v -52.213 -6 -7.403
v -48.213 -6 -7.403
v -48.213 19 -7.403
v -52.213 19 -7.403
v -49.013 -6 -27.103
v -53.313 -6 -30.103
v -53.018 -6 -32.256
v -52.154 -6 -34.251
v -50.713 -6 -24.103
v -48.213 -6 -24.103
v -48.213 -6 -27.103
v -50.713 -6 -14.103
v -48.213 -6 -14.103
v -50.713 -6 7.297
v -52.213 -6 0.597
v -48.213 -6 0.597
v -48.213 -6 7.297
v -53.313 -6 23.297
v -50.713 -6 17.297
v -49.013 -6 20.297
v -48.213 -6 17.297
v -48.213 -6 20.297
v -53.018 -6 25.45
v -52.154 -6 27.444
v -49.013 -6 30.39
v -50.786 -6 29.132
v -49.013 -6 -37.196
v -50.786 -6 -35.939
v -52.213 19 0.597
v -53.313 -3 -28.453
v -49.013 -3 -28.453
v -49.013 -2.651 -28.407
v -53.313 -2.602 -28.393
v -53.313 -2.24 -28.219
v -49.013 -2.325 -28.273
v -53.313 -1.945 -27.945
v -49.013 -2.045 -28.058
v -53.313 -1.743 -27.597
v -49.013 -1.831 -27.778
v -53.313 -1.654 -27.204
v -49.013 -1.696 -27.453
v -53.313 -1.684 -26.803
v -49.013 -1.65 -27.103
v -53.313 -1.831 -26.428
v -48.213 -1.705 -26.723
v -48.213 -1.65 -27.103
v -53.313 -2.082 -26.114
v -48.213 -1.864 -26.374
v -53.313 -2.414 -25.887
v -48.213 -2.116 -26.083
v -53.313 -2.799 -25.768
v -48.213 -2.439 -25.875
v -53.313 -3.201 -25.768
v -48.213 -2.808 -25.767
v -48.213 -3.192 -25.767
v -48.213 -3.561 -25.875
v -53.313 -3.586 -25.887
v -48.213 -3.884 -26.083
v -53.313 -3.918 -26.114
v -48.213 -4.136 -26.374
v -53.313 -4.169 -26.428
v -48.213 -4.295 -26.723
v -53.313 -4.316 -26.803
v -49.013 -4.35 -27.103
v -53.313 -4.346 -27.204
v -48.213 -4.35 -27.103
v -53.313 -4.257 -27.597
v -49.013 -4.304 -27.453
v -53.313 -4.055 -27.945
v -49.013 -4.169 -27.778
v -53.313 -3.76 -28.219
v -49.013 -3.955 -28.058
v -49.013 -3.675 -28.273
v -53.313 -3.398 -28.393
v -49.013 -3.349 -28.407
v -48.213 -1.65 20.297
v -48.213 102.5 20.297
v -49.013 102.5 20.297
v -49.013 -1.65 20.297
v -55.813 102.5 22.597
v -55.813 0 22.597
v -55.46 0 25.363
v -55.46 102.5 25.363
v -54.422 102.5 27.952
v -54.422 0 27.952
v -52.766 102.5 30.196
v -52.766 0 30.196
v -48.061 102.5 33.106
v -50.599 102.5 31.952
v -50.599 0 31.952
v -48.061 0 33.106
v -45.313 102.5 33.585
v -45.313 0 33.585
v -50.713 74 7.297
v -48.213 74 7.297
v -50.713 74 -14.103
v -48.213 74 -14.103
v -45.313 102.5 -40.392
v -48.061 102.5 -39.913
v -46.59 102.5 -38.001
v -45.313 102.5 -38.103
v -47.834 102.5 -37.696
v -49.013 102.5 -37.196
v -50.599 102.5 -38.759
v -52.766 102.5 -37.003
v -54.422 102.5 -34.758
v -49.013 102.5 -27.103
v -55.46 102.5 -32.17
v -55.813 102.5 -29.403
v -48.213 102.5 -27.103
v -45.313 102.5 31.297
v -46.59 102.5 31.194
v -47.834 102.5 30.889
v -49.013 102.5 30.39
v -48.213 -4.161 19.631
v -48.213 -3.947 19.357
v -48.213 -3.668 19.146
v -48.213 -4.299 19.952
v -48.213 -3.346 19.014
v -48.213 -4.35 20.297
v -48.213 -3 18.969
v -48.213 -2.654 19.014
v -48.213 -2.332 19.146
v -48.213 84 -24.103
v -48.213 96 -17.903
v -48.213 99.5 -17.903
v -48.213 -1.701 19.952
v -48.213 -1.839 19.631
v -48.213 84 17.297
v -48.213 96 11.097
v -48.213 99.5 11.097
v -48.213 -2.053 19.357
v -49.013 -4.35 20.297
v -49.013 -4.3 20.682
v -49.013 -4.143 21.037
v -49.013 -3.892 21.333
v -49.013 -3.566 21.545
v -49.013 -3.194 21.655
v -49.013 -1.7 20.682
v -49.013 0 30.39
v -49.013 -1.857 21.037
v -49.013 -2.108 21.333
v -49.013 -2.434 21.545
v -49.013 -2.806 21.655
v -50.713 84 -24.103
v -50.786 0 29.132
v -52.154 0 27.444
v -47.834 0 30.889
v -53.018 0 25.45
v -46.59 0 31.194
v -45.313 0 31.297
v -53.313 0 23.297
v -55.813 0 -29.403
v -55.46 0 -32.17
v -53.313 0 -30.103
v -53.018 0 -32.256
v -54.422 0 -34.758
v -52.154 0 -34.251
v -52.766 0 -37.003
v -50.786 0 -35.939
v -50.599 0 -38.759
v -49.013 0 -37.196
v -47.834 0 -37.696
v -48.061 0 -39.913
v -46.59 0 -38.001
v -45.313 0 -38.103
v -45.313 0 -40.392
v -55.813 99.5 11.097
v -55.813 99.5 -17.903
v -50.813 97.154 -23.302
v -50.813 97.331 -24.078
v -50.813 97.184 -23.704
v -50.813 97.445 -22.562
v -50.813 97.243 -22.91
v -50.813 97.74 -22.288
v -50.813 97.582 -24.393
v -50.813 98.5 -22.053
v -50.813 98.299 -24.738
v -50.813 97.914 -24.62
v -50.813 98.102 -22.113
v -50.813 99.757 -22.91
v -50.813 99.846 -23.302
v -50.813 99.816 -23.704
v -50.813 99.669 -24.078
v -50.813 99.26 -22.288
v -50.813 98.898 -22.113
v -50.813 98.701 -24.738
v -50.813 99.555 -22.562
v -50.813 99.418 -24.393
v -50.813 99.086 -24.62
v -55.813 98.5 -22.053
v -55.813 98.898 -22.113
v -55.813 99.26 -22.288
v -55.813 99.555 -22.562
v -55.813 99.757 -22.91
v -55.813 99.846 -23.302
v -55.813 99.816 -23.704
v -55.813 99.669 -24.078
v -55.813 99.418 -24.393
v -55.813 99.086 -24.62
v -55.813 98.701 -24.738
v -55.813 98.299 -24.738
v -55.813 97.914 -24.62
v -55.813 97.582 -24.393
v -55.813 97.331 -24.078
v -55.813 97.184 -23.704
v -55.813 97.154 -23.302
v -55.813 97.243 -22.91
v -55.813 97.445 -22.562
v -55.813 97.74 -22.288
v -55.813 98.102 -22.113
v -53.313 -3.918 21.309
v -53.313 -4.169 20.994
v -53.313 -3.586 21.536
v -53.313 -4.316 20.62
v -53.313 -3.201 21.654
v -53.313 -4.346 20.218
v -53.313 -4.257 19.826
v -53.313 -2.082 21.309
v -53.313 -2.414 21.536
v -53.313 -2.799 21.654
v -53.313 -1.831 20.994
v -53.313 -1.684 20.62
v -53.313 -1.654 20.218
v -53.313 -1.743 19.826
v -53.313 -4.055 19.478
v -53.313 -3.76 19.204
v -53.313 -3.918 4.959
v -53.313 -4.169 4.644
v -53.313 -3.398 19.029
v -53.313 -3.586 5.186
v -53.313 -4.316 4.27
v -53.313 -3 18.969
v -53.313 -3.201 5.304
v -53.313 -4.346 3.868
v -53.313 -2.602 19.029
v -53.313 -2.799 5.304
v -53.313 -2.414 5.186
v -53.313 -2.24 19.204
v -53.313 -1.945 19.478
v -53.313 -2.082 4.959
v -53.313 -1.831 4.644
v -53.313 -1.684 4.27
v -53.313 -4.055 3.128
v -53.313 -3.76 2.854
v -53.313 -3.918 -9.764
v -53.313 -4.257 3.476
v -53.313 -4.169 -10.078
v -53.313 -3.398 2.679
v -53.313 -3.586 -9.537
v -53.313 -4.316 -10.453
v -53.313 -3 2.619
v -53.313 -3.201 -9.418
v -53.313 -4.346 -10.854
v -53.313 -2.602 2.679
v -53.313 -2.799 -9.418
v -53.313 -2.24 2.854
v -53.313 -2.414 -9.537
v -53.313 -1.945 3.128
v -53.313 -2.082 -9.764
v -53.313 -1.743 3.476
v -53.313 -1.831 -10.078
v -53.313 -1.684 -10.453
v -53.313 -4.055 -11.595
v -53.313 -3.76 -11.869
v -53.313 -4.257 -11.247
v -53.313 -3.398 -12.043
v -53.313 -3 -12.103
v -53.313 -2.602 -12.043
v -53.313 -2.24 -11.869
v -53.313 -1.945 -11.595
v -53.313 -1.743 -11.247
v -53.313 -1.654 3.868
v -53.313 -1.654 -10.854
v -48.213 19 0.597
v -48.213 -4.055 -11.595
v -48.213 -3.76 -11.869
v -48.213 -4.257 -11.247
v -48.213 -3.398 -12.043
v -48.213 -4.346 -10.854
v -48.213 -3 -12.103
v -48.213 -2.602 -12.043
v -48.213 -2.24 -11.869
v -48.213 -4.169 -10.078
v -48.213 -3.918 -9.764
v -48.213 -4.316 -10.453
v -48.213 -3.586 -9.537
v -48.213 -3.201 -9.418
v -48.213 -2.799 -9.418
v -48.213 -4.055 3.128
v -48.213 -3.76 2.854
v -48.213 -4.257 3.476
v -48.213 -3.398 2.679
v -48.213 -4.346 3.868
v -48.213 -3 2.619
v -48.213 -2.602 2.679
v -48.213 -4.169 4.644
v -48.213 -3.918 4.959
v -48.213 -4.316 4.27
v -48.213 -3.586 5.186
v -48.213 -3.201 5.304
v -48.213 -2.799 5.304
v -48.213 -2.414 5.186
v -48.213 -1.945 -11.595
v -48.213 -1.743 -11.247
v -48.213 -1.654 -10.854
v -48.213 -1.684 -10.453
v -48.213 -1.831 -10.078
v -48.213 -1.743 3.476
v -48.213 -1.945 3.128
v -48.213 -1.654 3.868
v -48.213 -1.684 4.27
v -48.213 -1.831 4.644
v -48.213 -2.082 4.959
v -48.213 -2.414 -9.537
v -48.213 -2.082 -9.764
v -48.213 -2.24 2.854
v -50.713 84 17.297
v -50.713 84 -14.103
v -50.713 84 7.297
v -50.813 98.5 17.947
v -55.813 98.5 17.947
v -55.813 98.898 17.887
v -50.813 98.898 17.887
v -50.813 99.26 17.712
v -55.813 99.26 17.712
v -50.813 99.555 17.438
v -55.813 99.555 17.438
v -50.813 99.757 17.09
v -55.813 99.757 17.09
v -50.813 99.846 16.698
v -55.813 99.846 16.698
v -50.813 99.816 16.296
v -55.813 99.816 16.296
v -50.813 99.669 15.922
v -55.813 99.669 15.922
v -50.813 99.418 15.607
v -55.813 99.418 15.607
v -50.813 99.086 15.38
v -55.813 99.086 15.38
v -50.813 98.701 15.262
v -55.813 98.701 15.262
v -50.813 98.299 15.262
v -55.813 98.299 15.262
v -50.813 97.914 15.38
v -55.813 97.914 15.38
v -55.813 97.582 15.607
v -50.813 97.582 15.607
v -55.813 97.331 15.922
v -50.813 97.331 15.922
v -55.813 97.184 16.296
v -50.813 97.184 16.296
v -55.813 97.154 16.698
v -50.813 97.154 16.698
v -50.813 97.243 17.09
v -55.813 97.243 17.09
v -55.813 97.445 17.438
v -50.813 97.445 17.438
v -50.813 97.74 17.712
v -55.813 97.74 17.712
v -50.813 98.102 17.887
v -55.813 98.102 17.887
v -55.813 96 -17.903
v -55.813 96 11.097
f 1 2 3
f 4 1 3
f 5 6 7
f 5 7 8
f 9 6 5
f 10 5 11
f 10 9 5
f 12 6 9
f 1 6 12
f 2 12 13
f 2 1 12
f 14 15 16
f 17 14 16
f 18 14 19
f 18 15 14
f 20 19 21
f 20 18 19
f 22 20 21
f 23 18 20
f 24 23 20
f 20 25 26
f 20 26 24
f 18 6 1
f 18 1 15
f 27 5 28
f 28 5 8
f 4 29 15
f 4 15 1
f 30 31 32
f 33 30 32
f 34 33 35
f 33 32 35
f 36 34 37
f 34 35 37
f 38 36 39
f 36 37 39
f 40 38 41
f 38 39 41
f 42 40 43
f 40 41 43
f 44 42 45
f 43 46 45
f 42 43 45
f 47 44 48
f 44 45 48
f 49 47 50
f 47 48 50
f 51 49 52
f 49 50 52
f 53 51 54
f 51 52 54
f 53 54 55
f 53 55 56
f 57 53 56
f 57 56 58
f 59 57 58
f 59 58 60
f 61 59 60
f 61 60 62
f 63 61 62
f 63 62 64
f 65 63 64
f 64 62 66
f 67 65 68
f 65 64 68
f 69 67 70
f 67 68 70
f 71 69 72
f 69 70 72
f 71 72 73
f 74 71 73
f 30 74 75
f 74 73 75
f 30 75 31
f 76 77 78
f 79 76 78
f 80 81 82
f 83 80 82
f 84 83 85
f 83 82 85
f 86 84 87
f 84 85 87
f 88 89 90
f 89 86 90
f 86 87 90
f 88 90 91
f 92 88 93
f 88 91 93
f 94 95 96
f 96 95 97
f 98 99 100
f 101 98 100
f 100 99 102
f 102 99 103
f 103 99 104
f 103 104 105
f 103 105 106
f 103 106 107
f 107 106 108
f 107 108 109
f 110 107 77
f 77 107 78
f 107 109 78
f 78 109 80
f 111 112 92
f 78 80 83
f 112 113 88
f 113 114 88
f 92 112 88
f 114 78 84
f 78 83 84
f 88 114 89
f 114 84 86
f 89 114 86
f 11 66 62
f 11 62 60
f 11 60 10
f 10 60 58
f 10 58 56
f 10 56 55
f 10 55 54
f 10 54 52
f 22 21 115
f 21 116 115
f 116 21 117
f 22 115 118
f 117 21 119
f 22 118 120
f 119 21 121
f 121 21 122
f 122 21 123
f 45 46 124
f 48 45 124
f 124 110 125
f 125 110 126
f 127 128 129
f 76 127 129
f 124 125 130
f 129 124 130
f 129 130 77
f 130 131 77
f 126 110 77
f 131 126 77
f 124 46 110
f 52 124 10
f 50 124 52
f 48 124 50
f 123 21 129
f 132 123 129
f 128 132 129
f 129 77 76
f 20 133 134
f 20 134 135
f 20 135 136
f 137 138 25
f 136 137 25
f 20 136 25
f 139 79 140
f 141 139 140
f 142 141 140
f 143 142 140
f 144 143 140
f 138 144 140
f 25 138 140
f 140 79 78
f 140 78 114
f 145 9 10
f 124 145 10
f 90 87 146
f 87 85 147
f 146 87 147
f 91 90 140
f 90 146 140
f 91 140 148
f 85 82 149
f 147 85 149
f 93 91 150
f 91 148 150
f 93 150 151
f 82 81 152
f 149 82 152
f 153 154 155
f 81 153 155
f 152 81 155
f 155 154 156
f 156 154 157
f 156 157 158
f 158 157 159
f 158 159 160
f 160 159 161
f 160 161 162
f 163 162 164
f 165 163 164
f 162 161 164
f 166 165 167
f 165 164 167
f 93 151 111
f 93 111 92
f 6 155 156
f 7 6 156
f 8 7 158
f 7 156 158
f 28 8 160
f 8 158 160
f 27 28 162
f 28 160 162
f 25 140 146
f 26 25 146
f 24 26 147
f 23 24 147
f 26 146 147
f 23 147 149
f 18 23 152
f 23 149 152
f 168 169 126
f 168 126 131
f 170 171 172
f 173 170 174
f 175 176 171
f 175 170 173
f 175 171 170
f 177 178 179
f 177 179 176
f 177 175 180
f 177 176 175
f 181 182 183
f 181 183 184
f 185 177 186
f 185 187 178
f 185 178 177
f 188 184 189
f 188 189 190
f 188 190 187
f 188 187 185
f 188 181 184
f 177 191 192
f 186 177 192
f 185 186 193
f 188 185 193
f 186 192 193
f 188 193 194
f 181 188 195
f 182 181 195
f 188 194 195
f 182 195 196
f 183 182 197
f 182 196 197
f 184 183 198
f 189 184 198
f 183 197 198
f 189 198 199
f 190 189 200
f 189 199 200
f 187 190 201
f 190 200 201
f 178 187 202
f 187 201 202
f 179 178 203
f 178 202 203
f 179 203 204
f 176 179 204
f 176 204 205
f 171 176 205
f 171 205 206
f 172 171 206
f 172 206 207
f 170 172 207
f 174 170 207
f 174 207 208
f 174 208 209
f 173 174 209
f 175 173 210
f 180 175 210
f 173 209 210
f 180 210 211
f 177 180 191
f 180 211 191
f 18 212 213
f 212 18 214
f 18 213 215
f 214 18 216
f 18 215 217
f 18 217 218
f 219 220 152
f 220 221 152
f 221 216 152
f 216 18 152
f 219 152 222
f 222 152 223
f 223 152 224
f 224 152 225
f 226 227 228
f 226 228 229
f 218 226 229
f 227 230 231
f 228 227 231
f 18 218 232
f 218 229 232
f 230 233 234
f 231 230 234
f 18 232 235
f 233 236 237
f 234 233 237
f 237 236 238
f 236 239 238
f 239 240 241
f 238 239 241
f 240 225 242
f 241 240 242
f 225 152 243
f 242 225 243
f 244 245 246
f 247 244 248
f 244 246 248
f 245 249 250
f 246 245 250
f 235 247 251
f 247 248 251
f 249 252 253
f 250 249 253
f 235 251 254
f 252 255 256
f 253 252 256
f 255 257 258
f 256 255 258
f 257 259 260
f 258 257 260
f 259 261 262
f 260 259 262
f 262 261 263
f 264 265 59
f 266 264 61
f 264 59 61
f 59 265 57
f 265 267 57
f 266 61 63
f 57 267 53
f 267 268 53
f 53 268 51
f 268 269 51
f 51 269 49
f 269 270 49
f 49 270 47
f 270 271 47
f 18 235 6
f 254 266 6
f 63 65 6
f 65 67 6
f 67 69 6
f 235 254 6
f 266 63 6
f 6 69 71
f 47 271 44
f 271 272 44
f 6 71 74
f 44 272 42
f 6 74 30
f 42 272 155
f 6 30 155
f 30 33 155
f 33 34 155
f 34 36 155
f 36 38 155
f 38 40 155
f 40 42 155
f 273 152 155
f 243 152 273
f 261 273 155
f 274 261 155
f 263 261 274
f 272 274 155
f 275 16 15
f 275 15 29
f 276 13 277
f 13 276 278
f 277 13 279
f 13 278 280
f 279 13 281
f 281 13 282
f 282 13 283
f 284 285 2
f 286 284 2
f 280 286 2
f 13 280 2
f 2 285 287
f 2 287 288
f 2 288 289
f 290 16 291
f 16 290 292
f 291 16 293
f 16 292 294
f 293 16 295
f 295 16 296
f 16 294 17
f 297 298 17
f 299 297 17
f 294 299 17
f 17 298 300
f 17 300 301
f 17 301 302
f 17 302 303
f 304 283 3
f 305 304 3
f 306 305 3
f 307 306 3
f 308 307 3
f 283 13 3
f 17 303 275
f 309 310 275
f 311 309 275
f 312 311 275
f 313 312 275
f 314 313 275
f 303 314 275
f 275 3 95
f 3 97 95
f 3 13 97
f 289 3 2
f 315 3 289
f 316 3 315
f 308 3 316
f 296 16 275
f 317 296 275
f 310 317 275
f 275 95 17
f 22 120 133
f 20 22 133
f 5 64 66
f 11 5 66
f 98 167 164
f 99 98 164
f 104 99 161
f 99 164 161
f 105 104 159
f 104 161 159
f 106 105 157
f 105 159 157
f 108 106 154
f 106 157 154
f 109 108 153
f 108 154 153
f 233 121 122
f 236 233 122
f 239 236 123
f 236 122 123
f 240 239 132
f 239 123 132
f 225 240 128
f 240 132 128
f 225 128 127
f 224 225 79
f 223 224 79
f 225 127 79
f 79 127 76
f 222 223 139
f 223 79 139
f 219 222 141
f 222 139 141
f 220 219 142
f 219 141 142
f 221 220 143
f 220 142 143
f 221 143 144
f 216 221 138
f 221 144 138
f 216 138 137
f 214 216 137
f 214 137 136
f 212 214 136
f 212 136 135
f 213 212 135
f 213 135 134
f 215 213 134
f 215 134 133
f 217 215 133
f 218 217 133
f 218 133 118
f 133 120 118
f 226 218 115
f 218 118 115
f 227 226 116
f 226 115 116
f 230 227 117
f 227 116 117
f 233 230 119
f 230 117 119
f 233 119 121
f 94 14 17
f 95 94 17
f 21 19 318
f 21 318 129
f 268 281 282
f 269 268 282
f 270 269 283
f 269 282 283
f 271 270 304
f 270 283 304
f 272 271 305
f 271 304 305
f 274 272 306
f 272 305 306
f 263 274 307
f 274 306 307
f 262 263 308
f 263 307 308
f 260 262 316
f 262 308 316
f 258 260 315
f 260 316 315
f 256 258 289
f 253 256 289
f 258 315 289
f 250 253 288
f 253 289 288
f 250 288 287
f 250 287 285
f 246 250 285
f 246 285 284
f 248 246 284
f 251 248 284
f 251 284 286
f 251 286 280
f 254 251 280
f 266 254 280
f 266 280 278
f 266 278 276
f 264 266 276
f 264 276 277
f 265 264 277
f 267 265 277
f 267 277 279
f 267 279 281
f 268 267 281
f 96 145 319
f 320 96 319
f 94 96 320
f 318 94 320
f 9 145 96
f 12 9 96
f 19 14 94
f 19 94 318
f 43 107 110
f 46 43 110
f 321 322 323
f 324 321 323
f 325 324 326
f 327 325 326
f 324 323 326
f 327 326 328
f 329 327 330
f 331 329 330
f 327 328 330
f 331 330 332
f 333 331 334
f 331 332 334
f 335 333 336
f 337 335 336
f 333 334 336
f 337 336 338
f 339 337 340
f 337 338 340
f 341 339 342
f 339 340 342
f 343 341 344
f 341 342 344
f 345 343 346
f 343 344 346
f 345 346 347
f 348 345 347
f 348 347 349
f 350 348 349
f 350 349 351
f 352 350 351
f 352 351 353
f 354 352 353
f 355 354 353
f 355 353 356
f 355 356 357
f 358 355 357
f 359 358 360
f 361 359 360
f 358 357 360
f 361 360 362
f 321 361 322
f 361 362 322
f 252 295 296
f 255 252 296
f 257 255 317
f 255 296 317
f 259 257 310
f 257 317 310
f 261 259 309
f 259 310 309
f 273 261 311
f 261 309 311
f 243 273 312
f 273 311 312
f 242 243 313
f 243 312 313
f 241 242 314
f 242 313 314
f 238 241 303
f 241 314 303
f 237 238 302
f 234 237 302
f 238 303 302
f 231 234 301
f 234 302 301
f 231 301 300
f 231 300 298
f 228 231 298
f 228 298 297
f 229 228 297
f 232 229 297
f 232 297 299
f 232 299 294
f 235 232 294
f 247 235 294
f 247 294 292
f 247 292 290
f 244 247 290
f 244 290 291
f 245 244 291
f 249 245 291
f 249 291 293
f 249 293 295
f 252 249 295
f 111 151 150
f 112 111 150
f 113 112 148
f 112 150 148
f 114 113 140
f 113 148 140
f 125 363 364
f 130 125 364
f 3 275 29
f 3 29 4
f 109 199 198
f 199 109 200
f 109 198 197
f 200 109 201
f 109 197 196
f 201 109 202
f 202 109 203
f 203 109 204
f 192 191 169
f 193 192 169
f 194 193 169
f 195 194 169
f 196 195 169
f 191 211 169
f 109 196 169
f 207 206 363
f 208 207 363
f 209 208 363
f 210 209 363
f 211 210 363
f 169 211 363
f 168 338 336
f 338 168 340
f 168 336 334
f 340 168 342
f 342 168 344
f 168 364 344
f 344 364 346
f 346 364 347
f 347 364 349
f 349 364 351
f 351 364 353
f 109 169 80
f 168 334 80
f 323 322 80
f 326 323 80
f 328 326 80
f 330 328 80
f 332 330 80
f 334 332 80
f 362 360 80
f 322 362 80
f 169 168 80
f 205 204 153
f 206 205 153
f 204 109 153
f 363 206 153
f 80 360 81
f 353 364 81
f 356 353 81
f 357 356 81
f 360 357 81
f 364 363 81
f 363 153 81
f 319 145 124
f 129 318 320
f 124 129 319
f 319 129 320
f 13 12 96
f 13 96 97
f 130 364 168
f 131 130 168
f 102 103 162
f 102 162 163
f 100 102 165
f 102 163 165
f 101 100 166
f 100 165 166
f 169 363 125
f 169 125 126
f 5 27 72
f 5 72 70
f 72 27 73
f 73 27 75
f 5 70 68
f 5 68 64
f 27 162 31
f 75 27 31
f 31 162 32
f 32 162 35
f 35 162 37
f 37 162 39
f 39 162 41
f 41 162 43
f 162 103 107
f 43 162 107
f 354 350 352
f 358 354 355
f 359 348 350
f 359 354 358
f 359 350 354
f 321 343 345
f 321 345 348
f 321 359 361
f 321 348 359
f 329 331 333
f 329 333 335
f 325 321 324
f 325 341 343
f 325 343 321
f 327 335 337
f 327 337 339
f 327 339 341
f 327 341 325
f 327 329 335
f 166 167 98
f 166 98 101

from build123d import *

# Parameters (mm, degrees)
BOSS_EXTRUDE1_DEPTH = 120
BOSS_EXTRUDE2_DEPTH = 120
SKETCH4_W           = 0.8
SKETCH4_H           = 47.4
BOSS_EXTRUDE3_DEPTH = 120
BOSS_EXTRUDE4_DEPTH = 6
SKETCH6_W           = 3.197214061
SKETCH6_H           = 10
SKETCH6_W_2         = 2.544721395
CUT_EXTRUDE1_DEPTH  = 90
SKETCH7_W           = 91.376615624
SKETCH7_H           = 120.194280457
CUT_EXTRUDE3_DEPTH  = 258
SKETCH8_W           = 8
SKETCH8_H           = 30.385133663
CUT_EXTRUDE4_DEPTH  = 4
SKETCH9_R           = 1.35
CUT_EXTRUDE5_DEPTH  = 11
SKETCH10_W          = 29
SKETCH10_H          = 3.5
CUT_EXTRUDE6_DEPTH  = 10
SKETCH11_W          = 115.146040633
SKETCH11_H          = 26.021704098
CUT_EXTRUDE7_DEPTH  = 103
SKETCH12_W          = 27.624810525
SKETCH12_H          = 10
CUT_EXTRUDE8_DEPTH  = 2.5
SKETCH13_R          = 1.35
CUT_EXTRUDE9_DEPTH  = 5


with BuildPart() as part:
    # Sketch1 → Boss-Extrude1 (new body)
    with BuildSketch(Plane(origin=(0, 0, 0), x_dir=(1, 0, 0), z_dir=(0, 1, 0))):
        with BuildLine():
            Line((-55.813088795, 29.403372847), (-55.813088795, -22.596627153))
            ThreePointArc((-55.813088795, -22.596627153), (-52.766075655, -30.195969229), (-45.313088795, -33.585257641))
            Line((-45.313088795, -33.585257641), (-45.313088795, -31.296627153))
            ThreePointArc((-45.313088795, -31.296627153), (-50.969943044, -28.953481402), (-53.313088795, -23.296627153))
            Line((-53.313088795, -23.296627153), (-53.313088795, 30.103372847))
            ThreePointArc((-53.313088795, 30.103372847), (-50.969943044, 35.760227097), (-45.313088795, 38.103372847))
            Line((-45.313088795, 38.103372847), (-45.313088795, 40.392003335))
            ThreePointArc((-45.313088795, 40.392003335), (-52.766075655, 37.002714924), (-55.813088795, 29.403372847))
        make_face()
        with BuildLine():
            Line((-45.313088795, -31.296627153), (-45.313088795, -33.585257641))
            ThreePointArc((-45.313088795, -33.585257641), (-45.063153419, -33.593784407), (-44.813088795, -33.596627153))
            Line((-44.813088795, -33.596627153), (7.186911205, -33.596627153))
            ThreePointArc((7.186911205, -33.596627153), (14.965085798, -30.374801746), (18.186911205, -22.596627153))
            Line((18.186911205, -22.596627153), (18.186911205, 29.403372847))
            ThreePointArc((18.186911205, 29.403372847), (14.965085798, 37.18154744), (7.186911205, 40.403372847))
            Line((7.186911205, 40.403372847), (-45.313088795, 40.403372847))
            Line((-45.313088795, 40.403372847), (-45.313088795, 40.392003335))
            Line((-45.313088795, 40.392003335), (-45.313088795, 38.103372847))
            Line((-45.313088795, 38.103372847), (7.686911205, 38.103372847))
            ThreePointArc((7.686911205, 38.103372847), (13.343765455, 35.760227097), (15.686911205, 30.103372847))
            Line((15.686911205, 30.103372847), (15.686911205, -23.296627153))
            ThreePointArc((15.686911205, -23.296627153), (13.343765455, -28.953481402), (7.686911205, -31.296627153))
            Line((7.686911205, -31.296627153), (-45.313088795, -31.296627153))
        make_face()
    extrude(amount=BOSS_EXTRUDE1_DEPTH)

    # Sketch3 → Boss-Extrude2 (add)
    with BuildSketch(Plane.XZ):
        Polygon((-49.013088795, 31.972735522), (-49.013088795, -37.623215713), (-53.336517426, -34.913867104), (-55.11106611, -29.984565206), (-55.11106611, -26.811210851), (-55.11106611, 25.452378342), (-53.652842224, 27.779331351), (-52.073193111, 30.226675048), align=None)
        Polygon((11.386911205, 31.972735522), (11.386911205, -38.487790626), (13.269736219, -37.809973621), (16.737085445, -32.276969537), (16.568342629, -31.170966754), (16.568342629, 24.789777041), (15.03852436, 28.997230807), align=None)
    extrude(amount=-BOSS_EXTRUDE2_DEPTH)

    # Sketch4 → Boss-Extrude3 (add)
    with BuildSketch(Plane.XZ):
        with Locations((10.986911205, -3.403372847)):
            Rectangle(SKETCH4_W, SKETCH4_H)
        with Locations((-48.613088795, -3.403372847)):
            Rectangle(SKETCH4_W, SKETCH4_H)
    extrude(amount=-BOSS_EXTRUDE3_DEPTH)

    # Sketch5 → Boss-Extrude4 (add)
    with BuildSketch(Plane.XZ):
        with BuildLine():
            ThreePointArc((-49.013088795, 30.389581403), (-52.154141346, 27.443915423), (-53.313088795, 23.296627153))
            Line((-53.313088795, 23.296627153), (-53.313088795, -30.103372847))
            ThreePointArc((-53.313088795, -30.103372847), (-52.154141346, -34.250661118), (-49.013088795, -37.196327098))
            Line((-49.013088795, -37.196327098), (-49.013088795, -27.103372847))
            Line((-49.013088795, -27.103372847), (-48.213088795, -27.103372847))
            Line((-48.213088795, -27.103372847), (-48.213088795, 20.296627153))
            Line((-48.213088795, 20.296627153), (-49.013088795, 20.296627153))
            Line((-49.013088795, 20.296627153), (-49.013088795, 30.389581403))
        make_face()
        with BuildLine():
            ThreePointArc((11.386911205, -37.196327098), (14.527963756, -34.250661118), (15.686911205, -30.103372847))
            Line((15.686911205, -30.103372847), (15.686911205, 23.296627153))
            ThreePointArc((15.686911205, 23.296627153), (14.527963756, 27.443915423), (11.386911205, 30.389581403))
            Line((11.386911205, 30.389581403), (11.386911205, 20.296627153))
            Line((11.386911205, 20.296627153), (10.586911205, 20.296627153))
            Line((10.586911205, 20.296627153), (10.586911205, -27.103372847))
            Line((10.586911205, -27.103372847), (11.386911205, -27.103372847))
            Line((11.386911205, -27.103372847), (11.386911205, -37.196327098))
        make_face()
    extrude(amount=BOSS_EXTRUDE4_DEPTH)

    # Sketch6 → Cut-Extrude1 (cut)
    with BuildSketch(Plane.XZ.offset(6)):
        with Locations((-49.114481764, 12.296627153)):
            Rectangle(SKETCH6_W, SKETCH6_H)
        with Locations((-49.440728097, -19.103372847)):
            Rectangle(SKETCH6_W_2, SKETCH6_H)
        with Locations((11.814550508, -19.103372847)):
            Rectangle(SKETCH6_W_2, SKETCH6_H)
        with Locations((11.488304175, 12.296627153)):
            Rectangle(SKETCH6_W, SKETCH6_H)
    extrude(amount=-CUT_EXTRUDE1_DEPTH, mode=Mode.SUBTRACT)

    # Sketch7 → Cut-Extrude3 (cut)
    with BuildSketch(Plane.XZ.offset(6)):
        with Locations((0.375219017, -9.755963426)):
            Rectangle(SKETCH7_W, SKETCH7_H)
    extrude(amount=-CUT_EXTRUDE3_DEPTH, mode=Mode.SUBTRACT)

    # Sketch8 → Cut-Extrude4 (cut)
    with BuildSketch(Plane(origin=(-48.213088795, 0, 0), x_dir=(0, 0, -1), z_dir=(1, 0, 0))):
        with Locations((3.403372847, 3.807433168)):
            Rectangle(SKETCH8_W, SKETCH8_H)
    extrude(amount=-CUT_EXTRUDE4_DEPTH, mode=Mode.SUBTRACT)

    # Sketch9 → Cut-Extrude5 (cut)
    with BuildSketch(Plane(origin=(-48.213088795, 0, 0), x_dir=(0, 0, -1), z_dir=(1, 0, 0))):
        with Locations((-3.969366177, -3)):
            Circle(SKETCH9_R)
        with Locations((10.753372847, -3)):
            Circle(SKETCH9_R)
        with Locations((-20.319366177, -3)):
            Circle(SKETCH9_R)
        with Locations((27.103372847, -3)):
            Circle(SKETCH9_R)
    extrude(amount=-CUT_EXTRUDE5_DEPTH, mode=Mode.SUBTRACT)

    # Sketch10 → Cut-Extrude6 (cut)
    with BuildSketch(Plane.ZY.offset(55.813088795)):
        with Locations((-3.403372847, 97.75)):
            Rectangle(SKETCH10_W, SKETCH10_H)
    extrude(amount=-CUT_EXTRUDE6_DEPTH, mode=Mode.SUBTRACT)

    # Sketch11 → Cut-Extrude7 (cut)
    with BuildSketch(Plane.ZY.offset(55.813088795)):
        with Locations((0.013322813, 115.510852049)):
            Rectangle(SKETCH11_W, SKETCH11_H)
    extrude(amount=-CUT_EXTRUDE7_DEPTH, mode=Mode.SUBTRACT)

    # Sketch12 → Cut-Extrude8 (cut)
    with BuildSketch(Plane(origin=(-48.213088795, 0, 0), x_dir=(0, 0, -1), z_dir=(1, 0, 0))):
        with Locations((4.217176257, 79)):
            Rectangle(SKETCH12_W, SKETCH12_H)
    extrude(amount=-CUT_EXTRUDE8_DEPTH, mode=Mode.SUBTRACT)

    # Sketch13 → Cut-Extrude9 (cut)
    with BuildSketch(Plane.ZY.offset(55.813088795)):
        with Locations((-23.403372847, 98.5)):
            Circle(SKETCH13_R)
        with Locations((16.596627153, 98.5)):
            Circle(SKETCH13_R)
    extrude(amount=-CUT_EXTRUDE9_DEPTH, mode=Mode.SUBTRACT)


solid = part.part
